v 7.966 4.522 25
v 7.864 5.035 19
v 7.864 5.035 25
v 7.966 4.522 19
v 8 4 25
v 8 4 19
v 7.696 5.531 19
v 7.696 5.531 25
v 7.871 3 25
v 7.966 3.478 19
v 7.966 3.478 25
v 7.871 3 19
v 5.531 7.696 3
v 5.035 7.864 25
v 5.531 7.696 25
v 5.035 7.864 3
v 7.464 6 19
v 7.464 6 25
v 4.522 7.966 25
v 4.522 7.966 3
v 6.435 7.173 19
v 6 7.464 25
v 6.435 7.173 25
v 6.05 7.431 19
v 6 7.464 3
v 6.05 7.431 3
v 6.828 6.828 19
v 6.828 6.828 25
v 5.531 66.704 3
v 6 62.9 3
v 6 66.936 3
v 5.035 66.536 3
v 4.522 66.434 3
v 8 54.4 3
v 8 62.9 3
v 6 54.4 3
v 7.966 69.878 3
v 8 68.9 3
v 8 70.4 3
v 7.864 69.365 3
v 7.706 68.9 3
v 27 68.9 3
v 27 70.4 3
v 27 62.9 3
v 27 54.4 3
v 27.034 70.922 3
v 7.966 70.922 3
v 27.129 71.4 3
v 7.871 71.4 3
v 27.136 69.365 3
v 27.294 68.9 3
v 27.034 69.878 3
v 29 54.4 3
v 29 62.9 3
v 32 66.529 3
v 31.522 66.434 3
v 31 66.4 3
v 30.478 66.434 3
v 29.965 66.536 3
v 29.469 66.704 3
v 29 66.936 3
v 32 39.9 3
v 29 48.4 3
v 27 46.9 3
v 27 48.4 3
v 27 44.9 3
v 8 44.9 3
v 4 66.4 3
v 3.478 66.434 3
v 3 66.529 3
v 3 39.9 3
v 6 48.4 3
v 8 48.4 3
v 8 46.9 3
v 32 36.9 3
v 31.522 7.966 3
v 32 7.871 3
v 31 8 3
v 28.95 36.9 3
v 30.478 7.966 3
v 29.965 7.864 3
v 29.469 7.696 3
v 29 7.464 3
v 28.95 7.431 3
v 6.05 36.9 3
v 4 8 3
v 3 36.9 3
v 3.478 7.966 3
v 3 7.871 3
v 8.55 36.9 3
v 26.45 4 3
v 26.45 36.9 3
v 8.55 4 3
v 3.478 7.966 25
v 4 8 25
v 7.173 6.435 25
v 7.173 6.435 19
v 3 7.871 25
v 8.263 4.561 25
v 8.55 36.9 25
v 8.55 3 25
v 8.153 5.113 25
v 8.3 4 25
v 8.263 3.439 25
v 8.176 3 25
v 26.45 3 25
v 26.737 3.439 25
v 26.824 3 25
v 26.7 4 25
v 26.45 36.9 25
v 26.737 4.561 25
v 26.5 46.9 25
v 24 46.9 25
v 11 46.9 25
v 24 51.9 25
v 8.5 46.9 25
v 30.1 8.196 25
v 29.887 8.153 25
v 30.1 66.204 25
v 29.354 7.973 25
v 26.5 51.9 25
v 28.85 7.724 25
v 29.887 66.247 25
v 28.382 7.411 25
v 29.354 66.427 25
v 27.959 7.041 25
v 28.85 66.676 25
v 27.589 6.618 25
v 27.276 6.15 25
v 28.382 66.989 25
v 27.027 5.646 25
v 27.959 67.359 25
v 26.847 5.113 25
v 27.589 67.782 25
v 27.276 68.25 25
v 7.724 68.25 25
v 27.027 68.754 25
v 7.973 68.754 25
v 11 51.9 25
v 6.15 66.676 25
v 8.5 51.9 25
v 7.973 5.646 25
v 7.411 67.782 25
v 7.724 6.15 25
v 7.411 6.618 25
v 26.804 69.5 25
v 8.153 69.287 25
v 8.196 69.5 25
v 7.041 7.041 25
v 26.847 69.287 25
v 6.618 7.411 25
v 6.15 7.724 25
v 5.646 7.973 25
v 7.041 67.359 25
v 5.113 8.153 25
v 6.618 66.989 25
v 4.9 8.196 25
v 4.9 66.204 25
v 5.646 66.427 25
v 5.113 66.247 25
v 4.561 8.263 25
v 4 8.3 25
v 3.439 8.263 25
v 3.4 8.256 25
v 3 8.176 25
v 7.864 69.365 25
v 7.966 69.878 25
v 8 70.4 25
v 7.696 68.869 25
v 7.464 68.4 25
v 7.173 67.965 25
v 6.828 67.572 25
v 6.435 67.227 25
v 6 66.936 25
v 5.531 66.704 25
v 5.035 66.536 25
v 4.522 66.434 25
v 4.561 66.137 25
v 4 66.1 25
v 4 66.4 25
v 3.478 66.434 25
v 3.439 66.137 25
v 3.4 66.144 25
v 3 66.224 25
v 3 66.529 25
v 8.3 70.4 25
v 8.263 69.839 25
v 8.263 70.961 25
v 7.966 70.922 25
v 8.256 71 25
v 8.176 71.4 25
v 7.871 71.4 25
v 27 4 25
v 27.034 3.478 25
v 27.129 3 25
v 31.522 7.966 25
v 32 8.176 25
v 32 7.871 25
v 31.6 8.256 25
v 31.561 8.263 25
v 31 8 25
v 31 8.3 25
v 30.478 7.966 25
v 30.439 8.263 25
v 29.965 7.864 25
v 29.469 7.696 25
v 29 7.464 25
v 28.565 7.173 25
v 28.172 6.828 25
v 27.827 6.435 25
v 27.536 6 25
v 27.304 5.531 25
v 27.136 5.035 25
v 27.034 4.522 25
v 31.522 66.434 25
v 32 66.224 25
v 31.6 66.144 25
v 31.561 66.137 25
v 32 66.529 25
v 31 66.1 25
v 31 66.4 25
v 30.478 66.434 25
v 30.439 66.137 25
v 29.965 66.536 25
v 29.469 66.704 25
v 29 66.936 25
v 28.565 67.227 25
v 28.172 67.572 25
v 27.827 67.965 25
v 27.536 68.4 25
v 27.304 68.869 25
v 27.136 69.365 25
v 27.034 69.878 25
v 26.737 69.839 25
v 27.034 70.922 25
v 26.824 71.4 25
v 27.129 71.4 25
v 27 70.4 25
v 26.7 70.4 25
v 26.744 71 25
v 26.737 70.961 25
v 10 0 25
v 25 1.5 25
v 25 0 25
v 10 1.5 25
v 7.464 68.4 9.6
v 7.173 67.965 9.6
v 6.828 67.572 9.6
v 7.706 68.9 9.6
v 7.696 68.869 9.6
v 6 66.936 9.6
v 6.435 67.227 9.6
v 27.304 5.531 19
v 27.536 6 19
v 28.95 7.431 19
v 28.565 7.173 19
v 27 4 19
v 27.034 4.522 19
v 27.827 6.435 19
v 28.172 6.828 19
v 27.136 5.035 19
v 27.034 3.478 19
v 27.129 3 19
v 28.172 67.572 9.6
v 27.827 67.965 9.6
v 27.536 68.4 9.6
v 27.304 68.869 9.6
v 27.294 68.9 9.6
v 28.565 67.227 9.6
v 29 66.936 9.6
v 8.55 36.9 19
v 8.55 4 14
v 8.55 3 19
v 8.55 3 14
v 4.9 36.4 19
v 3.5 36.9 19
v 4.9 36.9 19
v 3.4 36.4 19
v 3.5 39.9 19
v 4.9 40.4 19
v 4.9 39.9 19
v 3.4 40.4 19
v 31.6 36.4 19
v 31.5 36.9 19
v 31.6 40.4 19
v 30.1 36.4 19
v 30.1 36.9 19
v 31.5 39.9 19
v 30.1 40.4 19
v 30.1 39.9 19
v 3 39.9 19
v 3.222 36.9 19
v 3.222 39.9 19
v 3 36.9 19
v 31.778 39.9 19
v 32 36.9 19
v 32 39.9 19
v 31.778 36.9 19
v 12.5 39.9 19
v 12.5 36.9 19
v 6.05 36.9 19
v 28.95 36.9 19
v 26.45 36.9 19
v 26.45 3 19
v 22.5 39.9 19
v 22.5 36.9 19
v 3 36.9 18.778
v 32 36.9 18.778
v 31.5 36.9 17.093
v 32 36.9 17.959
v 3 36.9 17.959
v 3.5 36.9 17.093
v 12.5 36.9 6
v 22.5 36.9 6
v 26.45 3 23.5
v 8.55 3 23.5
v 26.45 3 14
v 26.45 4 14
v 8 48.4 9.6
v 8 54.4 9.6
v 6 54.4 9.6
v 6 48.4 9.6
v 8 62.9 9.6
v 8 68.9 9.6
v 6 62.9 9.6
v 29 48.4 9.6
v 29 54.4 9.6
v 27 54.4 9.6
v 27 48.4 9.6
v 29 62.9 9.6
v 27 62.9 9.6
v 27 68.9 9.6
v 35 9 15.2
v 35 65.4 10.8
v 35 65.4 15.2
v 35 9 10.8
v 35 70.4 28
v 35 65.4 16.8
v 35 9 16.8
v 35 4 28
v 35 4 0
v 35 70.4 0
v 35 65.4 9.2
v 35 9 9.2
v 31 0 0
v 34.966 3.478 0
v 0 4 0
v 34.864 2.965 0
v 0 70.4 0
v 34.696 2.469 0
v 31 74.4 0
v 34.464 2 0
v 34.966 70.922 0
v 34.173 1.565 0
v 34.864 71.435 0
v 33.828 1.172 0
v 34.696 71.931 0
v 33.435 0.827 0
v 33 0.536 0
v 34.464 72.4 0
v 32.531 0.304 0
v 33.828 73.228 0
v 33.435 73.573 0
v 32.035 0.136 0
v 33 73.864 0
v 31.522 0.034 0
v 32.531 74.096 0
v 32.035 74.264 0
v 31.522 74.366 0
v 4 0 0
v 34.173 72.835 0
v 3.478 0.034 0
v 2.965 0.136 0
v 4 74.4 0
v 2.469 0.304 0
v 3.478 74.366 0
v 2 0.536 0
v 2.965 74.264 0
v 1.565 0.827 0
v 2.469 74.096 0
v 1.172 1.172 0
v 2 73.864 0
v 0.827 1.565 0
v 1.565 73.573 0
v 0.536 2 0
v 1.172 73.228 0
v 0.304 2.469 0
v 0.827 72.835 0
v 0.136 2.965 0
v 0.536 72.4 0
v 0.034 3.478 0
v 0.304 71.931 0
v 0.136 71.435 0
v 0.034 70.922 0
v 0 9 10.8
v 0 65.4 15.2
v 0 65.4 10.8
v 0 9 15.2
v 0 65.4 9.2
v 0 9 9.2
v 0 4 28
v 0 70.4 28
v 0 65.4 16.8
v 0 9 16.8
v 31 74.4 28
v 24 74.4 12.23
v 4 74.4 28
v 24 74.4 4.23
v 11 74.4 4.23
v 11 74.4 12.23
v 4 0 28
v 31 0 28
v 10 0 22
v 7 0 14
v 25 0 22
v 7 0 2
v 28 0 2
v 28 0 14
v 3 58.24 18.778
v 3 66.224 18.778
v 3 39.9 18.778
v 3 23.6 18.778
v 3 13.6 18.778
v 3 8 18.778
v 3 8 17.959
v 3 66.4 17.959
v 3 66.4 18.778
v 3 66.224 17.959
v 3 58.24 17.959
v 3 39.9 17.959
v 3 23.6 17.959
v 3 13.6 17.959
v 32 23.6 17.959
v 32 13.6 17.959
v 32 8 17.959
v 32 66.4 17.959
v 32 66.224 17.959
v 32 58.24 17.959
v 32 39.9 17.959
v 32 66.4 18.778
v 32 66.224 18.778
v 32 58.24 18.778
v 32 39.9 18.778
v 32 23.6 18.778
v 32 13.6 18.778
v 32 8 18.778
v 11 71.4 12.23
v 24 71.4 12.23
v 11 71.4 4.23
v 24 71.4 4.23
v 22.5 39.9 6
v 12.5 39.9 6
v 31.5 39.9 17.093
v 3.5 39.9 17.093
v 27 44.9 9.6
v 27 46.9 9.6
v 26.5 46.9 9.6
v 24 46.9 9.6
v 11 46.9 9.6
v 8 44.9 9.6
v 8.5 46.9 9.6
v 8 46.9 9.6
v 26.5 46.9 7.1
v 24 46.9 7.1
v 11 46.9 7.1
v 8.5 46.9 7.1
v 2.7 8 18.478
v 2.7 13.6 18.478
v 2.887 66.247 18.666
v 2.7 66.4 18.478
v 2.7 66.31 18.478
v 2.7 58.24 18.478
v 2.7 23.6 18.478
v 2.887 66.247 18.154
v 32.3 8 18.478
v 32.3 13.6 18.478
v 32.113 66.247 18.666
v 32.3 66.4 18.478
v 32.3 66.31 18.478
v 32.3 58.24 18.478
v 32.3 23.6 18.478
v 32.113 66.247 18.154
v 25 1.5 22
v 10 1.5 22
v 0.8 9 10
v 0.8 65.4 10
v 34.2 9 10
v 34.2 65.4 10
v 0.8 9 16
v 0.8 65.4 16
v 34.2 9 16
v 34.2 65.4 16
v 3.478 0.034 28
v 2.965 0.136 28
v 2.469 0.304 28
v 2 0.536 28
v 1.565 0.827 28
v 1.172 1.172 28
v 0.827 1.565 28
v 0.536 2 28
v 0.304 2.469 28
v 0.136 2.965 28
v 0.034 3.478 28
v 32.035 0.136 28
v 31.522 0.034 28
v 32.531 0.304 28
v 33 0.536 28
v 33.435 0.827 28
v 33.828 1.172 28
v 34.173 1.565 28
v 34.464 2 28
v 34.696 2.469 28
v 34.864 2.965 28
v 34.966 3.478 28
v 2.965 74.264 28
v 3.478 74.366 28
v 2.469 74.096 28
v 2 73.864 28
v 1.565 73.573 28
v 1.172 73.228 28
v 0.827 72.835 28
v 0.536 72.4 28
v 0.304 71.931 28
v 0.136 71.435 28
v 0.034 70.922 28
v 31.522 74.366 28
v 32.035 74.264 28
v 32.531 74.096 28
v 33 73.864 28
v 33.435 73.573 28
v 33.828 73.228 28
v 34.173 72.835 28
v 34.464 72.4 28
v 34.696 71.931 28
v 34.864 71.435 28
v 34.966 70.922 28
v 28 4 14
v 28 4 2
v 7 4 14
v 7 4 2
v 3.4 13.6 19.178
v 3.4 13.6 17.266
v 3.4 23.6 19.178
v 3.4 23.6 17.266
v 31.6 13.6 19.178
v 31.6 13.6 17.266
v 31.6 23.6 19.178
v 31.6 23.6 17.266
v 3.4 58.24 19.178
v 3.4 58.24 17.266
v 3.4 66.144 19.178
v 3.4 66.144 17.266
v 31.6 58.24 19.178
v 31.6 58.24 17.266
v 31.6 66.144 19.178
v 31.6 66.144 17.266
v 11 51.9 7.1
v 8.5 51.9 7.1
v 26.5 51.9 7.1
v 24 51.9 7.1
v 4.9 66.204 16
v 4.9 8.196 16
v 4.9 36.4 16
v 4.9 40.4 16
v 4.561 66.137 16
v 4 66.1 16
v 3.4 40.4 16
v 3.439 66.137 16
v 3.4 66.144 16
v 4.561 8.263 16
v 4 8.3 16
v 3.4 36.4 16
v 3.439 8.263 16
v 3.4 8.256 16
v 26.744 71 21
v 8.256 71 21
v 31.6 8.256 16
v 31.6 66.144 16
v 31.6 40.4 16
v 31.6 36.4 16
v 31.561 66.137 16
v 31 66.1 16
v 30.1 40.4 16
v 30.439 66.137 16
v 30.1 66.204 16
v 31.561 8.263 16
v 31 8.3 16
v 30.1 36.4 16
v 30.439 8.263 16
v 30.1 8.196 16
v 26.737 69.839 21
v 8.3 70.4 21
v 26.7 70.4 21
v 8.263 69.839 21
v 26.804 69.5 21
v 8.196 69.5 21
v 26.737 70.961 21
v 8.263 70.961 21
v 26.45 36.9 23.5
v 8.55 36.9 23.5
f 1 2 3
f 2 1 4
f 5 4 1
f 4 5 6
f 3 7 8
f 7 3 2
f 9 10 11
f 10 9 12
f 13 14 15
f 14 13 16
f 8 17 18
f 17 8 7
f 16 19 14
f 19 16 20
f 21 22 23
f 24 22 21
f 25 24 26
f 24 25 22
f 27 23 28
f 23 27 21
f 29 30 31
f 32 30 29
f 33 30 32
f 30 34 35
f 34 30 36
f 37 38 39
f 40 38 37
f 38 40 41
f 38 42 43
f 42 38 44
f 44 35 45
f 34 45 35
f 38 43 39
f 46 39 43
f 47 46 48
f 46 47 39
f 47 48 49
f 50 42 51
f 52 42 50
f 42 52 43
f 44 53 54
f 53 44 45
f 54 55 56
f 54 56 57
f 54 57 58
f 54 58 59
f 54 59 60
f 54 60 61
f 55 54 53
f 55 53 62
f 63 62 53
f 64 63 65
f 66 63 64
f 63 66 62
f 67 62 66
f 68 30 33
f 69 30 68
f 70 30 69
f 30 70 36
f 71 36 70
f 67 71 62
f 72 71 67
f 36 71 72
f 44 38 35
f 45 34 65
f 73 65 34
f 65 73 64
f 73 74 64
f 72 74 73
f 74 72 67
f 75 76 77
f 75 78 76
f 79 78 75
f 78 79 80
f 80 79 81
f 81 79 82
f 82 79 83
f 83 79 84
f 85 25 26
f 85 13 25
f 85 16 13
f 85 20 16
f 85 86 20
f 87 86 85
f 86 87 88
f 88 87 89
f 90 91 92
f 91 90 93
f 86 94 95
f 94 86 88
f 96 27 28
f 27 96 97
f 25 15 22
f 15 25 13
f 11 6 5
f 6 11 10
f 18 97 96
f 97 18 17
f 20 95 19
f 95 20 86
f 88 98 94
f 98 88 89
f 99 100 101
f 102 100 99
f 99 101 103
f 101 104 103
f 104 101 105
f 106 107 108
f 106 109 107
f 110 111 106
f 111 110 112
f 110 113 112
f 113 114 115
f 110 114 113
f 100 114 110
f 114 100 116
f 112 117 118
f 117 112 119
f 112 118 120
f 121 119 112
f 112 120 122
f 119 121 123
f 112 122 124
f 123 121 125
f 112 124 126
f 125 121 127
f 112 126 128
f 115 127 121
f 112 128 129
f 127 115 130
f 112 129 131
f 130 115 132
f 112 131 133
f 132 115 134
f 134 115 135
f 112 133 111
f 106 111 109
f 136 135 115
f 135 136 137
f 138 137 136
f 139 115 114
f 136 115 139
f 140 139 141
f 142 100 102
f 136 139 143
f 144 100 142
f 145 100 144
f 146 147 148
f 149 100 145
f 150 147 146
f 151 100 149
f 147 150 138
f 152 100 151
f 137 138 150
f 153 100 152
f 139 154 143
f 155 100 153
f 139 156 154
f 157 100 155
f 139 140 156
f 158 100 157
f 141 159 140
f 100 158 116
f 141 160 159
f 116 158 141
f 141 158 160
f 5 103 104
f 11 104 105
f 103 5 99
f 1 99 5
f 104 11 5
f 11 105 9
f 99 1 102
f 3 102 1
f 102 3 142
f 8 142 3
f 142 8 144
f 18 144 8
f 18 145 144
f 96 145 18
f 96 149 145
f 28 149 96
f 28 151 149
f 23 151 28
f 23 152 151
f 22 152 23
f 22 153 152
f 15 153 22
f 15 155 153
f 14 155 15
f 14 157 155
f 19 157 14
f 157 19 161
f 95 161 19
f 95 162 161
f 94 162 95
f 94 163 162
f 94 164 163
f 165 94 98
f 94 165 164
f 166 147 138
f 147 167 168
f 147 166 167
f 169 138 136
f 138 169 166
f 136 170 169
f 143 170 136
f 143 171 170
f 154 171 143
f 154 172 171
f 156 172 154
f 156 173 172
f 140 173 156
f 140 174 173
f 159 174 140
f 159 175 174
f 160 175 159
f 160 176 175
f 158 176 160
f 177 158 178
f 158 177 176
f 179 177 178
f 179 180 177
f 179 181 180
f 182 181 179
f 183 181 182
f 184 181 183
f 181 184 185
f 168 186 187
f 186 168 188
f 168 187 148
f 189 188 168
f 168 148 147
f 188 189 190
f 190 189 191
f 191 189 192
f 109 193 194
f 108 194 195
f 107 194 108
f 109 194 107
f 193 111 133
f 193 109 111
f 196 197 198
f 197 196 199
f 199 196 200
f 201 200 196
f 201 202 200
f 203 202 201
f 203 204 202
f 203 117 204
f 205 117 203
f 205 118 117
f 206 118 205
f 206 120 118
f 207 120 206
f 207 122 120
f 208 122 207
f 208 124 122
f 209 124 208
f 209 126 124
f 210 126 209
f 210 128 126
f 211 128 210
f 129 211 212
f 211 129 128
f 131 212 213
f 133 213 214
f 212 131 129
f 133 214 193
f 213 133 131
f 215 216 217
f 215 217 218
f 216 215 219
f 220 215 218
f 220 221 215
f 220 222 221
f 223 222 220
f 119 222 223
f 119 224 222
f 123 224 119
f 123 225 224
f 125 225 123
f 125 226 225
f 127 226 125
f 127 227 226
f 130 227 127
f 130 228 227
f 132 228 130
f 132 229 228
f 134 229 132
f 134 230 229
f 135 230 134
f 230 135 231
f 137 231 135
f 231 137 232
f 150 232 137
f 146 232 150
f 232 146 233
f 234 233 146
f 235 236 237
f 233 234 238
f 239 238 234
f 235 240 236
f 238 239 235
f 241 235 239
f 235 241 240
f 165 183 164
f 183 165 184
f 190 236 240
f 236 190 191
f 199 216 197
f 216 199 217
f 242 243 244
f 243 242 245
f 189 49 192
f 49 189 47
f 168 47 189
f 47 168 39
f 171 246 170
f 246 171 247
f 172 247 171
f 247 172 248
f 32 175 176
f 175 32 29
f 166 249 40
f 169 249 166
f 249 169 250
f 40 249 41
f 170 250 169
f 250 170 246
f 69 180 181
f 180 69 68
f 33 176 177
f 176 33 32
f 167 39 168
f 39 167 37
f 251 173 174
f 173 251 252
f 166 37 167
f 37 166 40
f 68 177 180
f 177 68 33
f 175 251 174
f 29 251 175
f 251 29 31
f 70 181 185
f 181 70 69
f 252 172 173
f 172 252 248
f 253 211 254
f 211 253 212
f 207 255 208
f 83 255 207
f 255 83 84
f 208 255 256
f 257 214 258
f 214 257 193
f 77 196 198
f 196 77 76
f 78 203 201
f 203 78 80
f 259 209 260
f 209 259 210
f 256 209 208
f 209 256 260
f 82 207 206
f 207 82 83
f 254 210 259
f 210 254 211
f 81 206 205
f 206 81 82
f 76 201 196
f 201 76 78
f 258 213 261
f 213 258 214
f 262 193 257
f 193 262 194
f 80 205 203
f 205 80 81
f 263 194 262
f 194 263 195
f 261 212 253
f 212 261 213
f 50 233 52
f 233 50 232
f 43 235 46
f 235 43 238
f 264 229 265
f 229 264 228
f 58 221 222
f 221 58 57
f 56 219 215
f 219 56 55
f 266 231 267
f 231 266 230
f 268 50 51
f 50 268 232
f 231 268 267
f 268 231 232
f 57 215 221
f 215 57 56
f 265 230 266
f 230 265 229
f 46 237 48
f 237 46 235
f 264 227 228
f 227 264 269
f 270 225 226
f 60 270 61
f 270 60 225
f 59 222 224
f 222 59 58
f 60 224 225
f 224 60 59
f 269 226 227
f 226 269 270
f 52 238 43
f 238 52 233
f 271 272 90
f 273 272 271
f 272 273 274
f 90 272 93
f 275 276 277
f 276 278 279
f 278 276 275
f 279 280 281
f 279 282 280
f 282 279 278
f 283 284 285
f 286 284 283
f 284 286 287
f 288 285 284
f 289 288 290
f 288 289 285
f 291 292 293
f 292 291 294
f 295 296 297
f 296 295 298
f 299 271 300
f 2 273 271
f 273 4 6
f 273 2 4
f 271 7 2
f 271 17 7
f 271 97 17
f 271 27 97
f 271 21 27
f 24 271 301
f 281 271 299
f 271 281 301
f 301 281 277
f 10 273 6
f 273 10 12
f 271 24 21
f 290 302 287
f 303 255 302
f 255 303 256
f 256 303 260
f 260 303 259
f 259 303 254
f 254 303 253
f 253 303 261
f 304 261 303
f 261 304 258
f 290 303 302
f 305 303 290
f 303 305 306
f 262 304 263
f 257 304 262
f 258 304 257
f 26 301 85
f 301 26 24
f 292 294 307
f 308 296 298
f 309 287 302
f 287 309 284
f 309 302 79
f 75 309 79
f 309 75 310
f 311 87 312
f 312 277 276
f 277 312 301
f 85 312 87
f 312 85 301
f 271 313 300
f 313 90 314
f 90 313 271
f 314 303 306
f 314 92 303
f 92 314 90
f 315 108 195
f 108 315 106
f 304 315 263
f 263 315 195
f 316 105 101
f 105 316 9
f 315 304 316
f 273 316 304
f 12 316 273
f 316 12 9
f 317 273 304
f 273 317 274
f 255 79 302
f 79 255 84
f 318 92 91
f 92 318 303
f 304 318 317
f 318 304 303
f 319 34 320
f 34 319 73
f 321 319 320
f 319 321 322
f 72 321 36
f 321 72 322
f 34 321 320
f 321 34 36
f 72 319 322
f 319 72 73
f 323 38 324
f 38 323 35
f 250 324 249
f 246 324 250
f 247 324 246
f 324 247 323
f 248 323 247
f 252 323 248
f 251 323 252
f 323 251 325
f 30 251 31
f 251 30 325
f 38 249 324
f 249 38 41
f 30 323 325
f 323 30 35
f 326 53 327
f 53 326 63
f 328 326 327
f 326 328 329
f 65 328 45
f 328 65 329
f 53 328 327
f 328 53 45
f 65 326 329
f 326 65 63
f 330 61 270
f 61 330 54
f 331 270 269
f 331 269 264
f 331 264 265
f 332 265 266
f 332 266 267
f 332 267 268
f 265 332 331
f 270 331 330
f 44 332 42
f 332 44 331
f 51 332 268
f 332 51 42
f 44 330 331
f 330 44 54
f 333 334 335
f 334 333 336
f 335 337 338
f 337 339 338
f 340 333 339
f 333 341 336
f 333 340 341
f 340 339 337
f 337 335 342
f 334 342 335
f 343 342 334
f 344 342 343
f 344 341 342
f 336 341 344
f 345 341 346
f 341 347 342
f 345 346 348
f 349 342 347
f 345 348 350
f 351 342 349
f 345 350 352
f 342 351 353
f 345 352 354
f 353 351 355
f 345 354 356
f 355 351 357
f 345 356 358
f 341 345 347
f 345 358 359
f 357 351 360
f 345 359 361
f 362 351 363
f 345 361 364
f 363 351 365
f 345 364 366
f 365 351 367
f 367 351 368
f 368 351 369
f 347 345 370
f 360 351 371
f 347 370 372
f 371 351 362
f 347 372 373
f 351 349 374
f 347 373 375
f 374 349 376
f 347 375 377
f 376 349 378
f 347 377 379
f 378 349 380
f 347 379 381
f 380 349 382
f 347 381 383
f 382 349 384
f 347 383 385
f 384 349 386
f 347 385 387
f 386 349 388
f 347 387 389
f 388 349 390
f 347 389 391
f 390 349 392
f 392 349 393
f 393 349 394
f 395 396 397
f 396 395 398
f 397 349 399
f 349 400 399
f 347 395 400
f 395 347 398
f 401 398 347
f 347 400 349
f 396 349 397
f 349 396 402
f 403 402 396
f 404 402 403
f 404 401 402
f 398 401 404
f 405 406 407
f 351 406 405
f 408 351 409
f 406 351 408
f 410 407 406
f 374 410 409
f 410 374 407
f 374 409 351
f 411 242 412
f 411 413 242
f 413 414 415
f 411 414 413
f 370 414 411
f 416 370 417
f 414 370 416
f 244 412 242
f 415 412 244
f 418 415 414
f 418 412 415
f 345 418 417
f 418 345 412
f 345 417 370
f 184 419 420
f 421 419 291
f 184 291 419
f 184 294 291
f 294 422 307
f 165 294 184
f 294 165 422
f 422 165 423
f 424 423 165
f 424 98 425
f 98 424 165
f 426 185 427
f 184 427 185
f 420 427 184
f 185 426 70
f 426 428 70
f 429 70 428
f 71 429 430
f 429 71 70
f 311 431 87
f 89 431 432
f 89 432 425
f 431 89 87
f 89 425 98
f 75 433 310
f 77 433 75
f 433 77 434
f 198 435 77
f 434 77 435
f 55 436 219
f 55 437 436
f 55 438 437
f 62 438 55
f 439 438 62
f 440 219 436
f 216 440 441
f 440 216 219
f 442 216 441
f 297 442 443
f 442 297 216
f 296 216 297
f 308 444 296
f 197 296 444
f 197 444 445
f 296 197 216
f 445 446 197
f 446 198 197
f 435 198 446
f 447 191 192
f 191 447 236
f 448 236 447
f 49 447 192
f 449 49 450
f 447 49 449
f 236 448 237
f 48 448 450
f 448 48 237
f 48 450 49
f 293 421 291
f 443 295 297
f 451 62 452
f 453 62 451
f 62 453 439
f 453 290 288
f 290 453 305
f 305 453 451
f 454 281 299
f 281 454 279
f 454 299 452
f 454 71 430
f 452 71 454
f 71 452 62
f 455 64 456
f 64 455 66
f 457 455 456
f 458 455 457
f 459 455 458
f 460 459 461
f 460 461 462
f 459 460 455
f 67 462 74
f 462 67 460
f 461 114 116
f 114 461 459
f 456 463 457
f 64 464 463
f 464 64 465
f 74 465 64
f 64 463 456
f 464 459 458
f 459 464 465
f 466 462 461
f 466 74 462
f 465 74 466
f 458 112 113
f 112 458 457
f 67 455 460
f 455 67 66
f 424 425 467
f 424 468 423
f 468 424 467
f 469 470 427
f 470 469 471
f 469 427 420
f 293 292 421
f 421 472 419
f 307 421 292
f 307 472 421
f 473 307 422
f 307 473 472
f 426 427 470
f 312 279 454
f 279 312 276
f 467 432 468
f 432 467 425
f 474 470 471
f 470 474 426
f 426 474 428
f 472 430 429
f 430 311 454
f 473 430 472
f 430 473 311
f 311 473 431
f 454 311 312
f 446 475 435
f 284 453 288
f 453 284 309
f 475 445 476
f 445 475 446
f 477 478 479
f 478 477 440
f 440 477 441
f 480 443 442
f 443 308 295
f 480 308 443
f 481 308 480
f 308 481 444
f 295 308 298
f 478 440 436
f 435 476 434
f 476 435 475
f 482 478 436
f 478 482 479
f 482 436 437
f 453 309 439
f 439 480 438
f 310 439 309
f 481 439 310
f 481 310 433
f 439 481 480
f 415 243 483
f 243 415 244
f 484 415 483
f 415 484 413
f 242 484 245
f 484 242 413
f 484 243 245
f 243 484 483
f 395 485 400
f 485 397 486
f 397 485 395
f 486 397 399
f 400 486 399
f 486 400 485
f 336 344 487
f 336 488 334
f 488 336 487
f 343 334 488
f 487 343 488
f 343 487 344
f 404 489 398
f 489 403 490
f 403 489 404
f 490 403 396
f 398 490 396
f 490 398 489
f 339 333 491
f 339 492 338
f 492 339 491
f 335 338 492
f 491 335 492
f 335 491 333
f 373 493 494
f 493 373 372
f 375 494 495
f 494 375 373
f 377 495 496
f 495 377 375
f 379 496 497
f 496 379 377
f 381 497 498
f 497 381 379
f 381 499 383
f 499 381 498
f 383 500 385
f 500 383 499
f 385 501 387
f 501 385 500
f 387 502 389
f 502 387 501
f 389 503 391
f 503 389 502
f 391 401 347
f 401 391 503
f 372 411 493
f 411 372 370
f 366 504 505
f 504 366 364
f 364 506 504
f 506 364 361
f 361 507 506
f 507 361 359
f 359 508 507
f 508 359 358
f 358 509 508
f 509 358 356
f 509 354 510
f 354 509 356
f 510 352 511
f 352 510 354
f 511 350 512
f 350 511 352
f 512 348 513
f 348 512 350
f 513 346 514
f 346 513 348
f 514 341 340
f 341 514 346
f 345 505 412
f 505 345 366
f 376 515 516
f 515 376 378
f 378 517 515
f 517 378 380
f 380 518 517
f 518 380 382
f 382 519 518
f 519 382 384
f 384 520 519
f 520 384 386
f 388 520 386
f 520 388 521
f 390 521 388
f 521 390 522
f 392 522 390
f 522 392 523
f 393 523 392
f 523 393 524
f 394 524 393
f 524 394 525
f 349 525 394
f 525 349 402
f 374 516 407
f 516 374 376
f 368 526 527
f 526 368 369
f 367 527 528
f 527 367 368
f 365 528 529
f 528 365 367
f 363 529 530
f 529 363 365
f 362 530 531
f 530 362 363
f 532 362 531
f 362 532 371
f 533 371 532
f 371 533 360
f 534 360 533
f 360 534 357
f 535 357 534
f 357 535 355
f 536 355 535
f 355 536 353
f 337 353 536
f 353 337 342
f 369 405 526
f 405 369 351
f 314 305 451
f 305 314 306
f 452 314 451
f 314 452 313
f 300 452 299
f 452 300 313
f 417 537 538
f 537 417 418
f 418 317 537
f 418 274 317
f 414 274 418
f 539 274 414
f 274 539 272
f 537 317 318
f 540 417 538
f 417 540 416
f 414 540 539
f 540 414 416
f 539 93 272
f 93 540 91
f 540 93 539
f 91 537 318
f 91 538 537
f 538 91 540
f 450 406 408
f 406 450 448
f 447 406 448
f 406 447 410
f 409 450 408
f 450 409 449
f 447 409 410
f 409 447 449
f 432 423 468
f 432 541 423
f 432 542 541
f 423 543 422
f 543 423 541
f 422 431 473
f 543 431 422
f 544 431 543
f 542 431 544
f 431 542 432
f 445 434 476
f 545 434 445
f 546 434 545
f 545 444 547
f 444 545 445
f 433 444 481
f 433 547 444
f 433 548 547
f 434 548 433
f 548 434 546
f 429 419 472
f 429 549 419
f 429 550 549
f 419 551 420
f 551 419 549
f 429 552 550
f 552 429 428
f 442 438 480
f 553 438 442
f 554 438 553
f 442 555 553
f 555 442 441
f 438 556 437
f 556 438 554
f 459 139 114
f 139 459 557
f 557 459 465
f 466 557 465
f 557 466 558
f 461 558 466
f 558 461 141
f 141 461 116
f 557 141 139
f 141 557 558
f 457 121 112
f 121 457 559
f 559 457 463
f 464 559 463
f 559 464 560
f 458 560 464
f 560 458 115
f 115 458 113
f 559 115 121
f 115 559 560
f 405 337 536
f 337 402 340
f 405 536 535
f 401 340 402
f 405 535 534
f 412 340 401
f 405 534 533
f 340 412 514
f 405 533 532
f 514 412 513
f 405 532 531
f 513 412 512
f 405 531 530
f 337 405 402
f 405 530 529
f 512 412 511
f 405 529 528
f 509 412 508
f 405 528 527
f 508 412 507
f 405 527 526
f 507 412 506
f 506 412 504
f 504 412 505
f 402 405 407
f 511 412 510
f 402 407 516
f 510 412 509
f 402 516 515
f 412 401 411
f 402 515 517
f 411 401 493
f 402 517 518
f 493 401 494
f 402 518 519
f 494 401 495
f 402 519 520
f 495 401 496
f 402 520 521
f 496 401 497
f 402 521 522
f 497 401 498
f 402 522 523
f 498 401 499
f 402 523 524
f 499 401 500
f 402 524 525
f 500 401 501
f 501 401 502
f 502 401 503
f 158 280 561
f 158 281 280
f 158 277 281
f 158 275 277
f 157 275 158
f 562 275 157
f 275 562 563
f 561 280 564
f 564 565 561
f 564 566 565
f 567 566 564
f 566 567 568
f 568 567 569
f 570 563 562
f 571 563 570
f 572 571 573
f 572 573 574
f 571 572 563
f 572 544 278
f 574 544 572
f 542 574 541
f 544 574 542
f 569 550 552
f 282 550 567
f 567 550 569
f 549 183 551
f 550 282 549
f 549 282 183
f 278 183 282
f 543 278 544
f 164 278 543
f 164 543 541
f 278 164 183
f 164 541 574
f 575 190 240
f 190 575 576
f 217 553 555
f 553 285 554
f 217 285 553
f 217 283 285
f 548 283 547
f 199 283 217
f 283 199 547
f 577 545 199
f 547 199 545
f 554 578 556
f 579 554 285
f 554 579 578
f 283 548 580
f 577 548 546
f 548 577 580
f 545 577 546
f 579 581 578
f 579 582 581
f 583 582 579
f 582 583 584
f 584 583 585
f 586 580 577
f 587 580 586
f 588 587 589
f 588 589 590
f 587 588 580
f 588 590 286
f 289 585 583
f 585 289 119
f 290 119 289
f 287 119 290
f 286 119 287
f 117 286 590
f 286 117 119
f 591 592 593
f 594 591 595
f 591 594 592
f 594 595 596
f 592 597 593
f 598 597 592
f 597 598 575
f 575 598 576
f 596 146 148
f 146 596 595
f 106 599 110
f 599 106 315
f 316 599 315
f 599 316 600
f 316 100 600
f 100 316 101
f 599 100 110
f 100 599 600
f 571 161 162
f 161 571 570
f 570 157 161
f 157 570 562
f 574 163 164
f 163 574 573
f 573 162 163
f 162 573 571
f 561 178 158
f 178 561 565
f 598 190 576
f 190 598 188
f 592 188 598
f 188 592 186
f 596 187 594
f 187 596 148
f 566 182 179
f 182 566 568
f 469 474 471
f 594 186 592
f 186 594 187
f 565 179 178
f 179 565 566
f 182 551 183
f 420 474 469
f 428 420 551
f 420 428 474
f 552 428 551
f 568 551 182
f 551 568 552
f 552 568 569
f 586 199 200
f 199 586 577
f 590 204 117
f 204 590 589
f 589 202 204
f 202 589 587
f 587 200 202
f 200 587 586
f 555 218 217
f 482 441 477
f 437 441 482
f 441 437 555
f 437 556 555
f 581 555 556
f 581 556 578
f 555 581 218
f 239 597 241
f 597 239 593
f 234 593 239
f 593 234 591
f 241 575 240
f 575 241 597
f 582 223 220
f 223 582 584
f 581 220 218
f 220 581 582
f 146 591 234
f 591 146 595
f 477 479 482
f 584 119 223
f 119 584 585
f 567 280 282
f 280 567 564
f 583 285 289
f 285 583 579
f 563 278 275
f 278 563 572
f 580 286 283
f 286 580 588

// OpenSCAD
// vo-hop-sleeppad-c3.scad — Vỏ hộp cho node sleep-pad: ESP32-C3 Super Mini + 1 cổng USB-A cố định.
// THAY THẾ vo-hop-sleeppad.scad (thiết kế cho ESP32-S3-CAM) — firmware sleep-pad-node đã đổi
// sang C3 Super Mini (nologo_esp32c3_super_mini) từ 24/08. File S3 GIỮ NGUYÊN làm tài liệu lịch
// sử, không xoá. In 2 mảnh: base (sàn + 4 vách) và lid (nắp, khớp bấm — không vít).
//
// CÔNG DỤNG: hộp ngồi dưới sàn/gầm giường, đầu USB-A nhận cáp 4 dây của tấm LSM-800-T, đầu
// USB-C ra nguồn/nạp cho C3. Cáp ra HAI ĐẦU ĐỐI DIỆN nên không chồng dây — GIỮ NGUYÊN lý do gốc
// của bản S3 dù C3 hẹp hơn nhiều nên bố cục song song giờ đã vừa (xem plan
// 260904-0811-thiet-ke-vo-hop-sensor-c3-va-voice-radar): lý do ergonomic (2 đầu dây ra 2 phía
// khi đặt dưới gầm giường) độc lập với bề rộng board — quyết định 04/09, không đổi bố cục.
//
// ⚠️ CỔNG USB-A TRÊN HỘP NÀY KHÔNG PHẢI USB. Nó là UART 115200 8N1 + 5V, đấu qua khối breakout
// USB-A → 4 chân (VCC/GND/D+/D- dùng lại làm UART, xem firmware/sleep-pad-node/include/config.h).
// Cắm chuột/USB thường vào đây thì không cháy nhưng cũng không chạy. Nắp khắc chữ cảnh báo.
//
// VẬT LIỆU: PETG, thành 3mm, FDM. KHÔNG in resin — lý do giống bản S3 (ren đồng ép nóng cần
// nhựa nhiệt dẻo, resin giòn và nằm dưới sàn dễ bị đá phải).
//
// === NGUỒN SỐ ĐO ===
// Khối usba_* CHÉP NGUYÊN VĂN từ vo-hop-sleeppad.scad — linh kiện không đổi, không đo lại.
//
// Khối c3_* — ĐO TAY THẬT 04/09 (không dùng số web 22.5×18mm làm số cuối, đúng bài học đã ghi
// 2 lần trong bản S3 về việc tin số liệu mạng):
//   c3_l = 23.5mm — đo TỪ MÉP CỔNG USB-C (mốc đo, không phải mép board đối diện).
//   c3_w = 18mm.
//   c3_pcb_t = 1.6mm — CHƯA đo tay riêng, dùng số PCB tiêu chuẩn (board mỏng kiểu này hầu hết
//     1.6mm) — chấp nhận theo quyết định 04/09, sửa lại nếu ướm thử lệch.
//   c3_comp_h = 3.5mm — linh kiện cao nhất (chip/nút) — ƯỚC TÍNH, CHƯA ĐO — quyết định 04/09
//     chấp nhận tạm, PHẢI xác nhận bằng miếng ướm (xem test_c3()) trước khi in cả hộp.
//   USB-C ở GIỮA cạnh ngắn (18mm) — xác nhận bằng mắt 04/09, không phải số đo panme.
//   KHÔNG có lỗ vít (board kiểu breadboard trần) — xác nhận 04/09.
//   KHÔNG cần lỗ nút RESET/BOOT trên vỏ — nạp firmware qua USB-C là đủ, quyết định 04/09.
//
// === ĐỊNH VỊ C3: POCKET 4 CẠNH + DÁN, KHÔNG VÍT ===
// Khác hẳn cách bản S3 giữ board (2 trụ vít + 2 trụ đỡ + gờ dẫn hướng chỉ 2 cạnh dài), vì C3
// không có lỗ vít nào. Dùng gờ dẫn hướng bao đủ 4 cạnh (kiểu "định vị + dán" — cùng triết lý đã
// áp dụng cho module radar LD2410C trong vo-hop-modular.scad, module đó cũng không có lỗ vít).
// Thêm 1 cặp gờ chặn nhấc (+z) trên 2 cạnh dài vì không có vít giữ theo phương đứng.

part = "assembly";   // "base" | "lid" | "assembly" | "exploded" | "layout" | "test-usba" | "test-c3"

/* ================= ESP32-C3 Super Mini (đo tay thật 04/09) ================= */
c3_l = 23.5;  c3_w = 18;          // PCB (dài × rộng) — dài đo từ mép cổng USB-C
c3_pcb_t = 1.6;                    // CHƯA đo riêng — số PCB tiêu chuẩn, xem ghi chú đầu file
c3_comp_h = 3.5;                   // linh kiện cao nhất — ƯỚC TÍNH, xem ghi chú đầu file
c3_stand = 2;                      // trụ/gờ đỡ dưới board — board không có chân header thò
                                    // xuống (hàn dây trực tiếp GPIO, không qua header), nên chỉ
                                    // cần hở tối thiểu tránh solder mask/pad chạm sàn.
c3_usb_w = 9;                      // bề rộng thân cổng USB-C + dung sai (thân danh nghĩa ~8.94,
                                    // xem cách tính s3_usb_w cũ trong vo-hop-sleeppad.scad)
c3_usb_plug_clear = 2;             // hở thêm mỗi bên cho vỏ NHỰA của phích — CHƯA đo cục nhựa
                                    // thật, dùng lại giá trị đã nghiệm thu ở bản S3.
c3_usb_open_w = c3_usb_w + 2*c3_usb_plug_clear;   // = 13
c3_usb_open_h = 8;                 // cao hơn thân cổng để nuốt cả vỏ nhựa phích (giữ số bản S3)
c3_usb_out = 0.5;                  // cổng USB-C thò ra khỏi mép PCB — ƯỚC TÍNH nhỏ, C3 supermini
                                    // thường hàn sát mép, khác S3-CAM (1mm) — xác nhận khi ướm.
c3_usb_gap = 0.5;                  // hở giữa mặt cổng và mặt TRONG vách sau (giữ số bản S3)

/* --- Gờ dẫn hướng bao 4 cạnh (thay 2 cạnh + lỗ vít của bản S3) --- */
c3_guide_clear = 0.5;              // hở mỗi bên giữa mép board và mặt trong gờ
c3_guide_t = 2;                    // bề dày mỗi gờ
c3_guide_over = 3;                 // gờ cao hơn nóc PCB bấy nhiêu — còn dẫn hướng suốt hành trình
c3_guide_seg = 6;                  // chiều dài mỗi đoạn gờ hông (ngắn hơn bản S3 vì board ngắn)
c3_guide_in = 1.5;                 // đoạn gờ lùi vào so 2 đầu board

/* --- Gờ chặn nhấc, treo dưới nắp (thay vít, khoá phương +z) --- */
c3_hold_on = true;
c3_hold_w = 2.5;                   // bề rộng mỗi gờ theo x, tính từ mép board vào
c3_hold_l = 5;                     // chiều dài theo y
c3_hold_gap = 0.5;                 // hở giữa đáy gờ và nóc PCB

/* ================= Khối breakout USB-A (chép nguyên văn vo-hop-sleeppad.scad) ================= */
usba_l = 32;
usba_w = 16;
usba_h = 20;
usba_fit = 1.9;                    // nới từ 0.4 lên 1.9 (+1.5mm) — user in ướm test-usba thật
                                    // (05/09), thấy 2 thanh chắn 2 bên bó sát quá, cần rộng thêm
                                    // 1-2mm. usba_fit đối xứng nên +1.5mm tổng độ hở nằm giữa
                                    // khoảng yêu cầu. LƯU Ý: biến này cũng cộng vào usba_back (xem
                                    // dưới) nên tự động góp +1.5mm vào out_l luôn, không phải side
                                    // effect ngoài ý muốn — user cũng yêu cầu vỏ dài thêm (xem
                                    // wire_gap bên dưới cho phần còn lại).
usba_axis_z = 5;
usba_plug_w = 18;  usba_plug_h = 9;  usba_plug_len = 20;
usba_plug_clear = 1.5;
usba_rib_t = 2.5;
usba_rib_h = 16;
usba_stop_t = 3;
usba_wire_w = 10;
usba_wire_z = 3;                   // hạ từ 11 xuống 3 — user in ướm test-usba thật, thấy dây điện
                                    // thật đi sát sàn hơn dự tính, khe cũ (bắt đầu ở 11mm) cản dây.
                                    // User chỉ định "cách mặt sàn 2-3mm" (05/09), không đo tay lại
                                    // toạ độ dây chính xác — chọn 3mm (đầu trên khoảng cho phép).
usba_hold_gap = 0.5;
usba_floor_min = 2;
wire_gap = 7;                      // nới từ 6 lên 7 (+1mm) — cộng với +1.5mm từ usba_fit ở trên,
                                    // tổng out_l dài thêm +2.5mm về hướng USB-A (nằm giữa khoảng
                                    // 2-3mm user yêu cầu 05/09). khoảng trống giữa vách chặn USB-A
                                    // và mép trước board C3

/* ================= Khung ================= */
// inner_w do C3 (18mm) quyết định, không phải khối USB-A (16mm) — C3 rộng hơn 2mm.
// PHẢI chừa đủ để mép board KHÔNG chạm vùng trụ góc (post_d=8, tangent mặt ngoài — post_off=4):
// điều kiện box_cx + c3_w/2 <= out_w - post_d, verify bằng CGAL (base ∩ ghosts phải RỖNG) —
// lần đầu tính inner_w=27 (out_w=33) THIẾU đúng 0.5mm, trụ góc sau-phải đụng mép board (bắt
// được qua kiểm CGAL thật 04/09, không phải suy đoán). +6 (thay +4) cho dư khoảng 1.5mm an toàn.
inner_w = c3_w + 2*(c3_guide_clear + c3_guide_t) + 6;   // = 18 + 2*2.5 + 6 = 29
wall = 3;  floor_t = 3;  lid_t = 3;
deck_h = 22;                       // vẫn do khối USB-A (cao 20) quyết định — C3 thấp hơn nhiều
post_d = 8;
post_off = post_d/2;
m3_free = 3.4;
m3_insert = 4.2;
insert_deep = 6;
lid_lip_h = 4;
lip_w = 1.5;
lip_gap = 0.4;

/* ================= Khớp bấm thay cho vít (giữ nguyên tham số bản S3) ================= */
vit_on = false;
lip_h_ben = 9;                     // NGẮN HƠN bản S3 (12.5) vì hộp ngắn hơn nhiều — cánh tay đòn
                                    // môi phải tính lại theo out_l mới, không copy số cũ nguyên
                                    // xi (xem cảnh báo trong vo-hop-sleeppad.scad về F=3EI·y/L³).
bam_cao = 0.7;
bam_dai = 10;
bam_vao_deg = 30;
bam_giu_deg = 45;
bay_w = 15;  bay_d = 1.5;  bay_h = 3;

label_on = false;
label_size = 4;
label_deep = 0.6;

/* ================= Vân trang trí ================= */
van_on = true;
van_sau = 0.8;
van_zs = [10, 16];                 // 2 mức thay vì 3 — hộp thấp/ngắn hơn bản S3
van_lo = 0.5;

goc_bo = true;
goc_r = post_off;

$fn = 48;

/* ================= Toạ độ suy ra ================= */
out_w = inner_w + 2*wall;                    // = 33
box_cx = out_w/2;                            // = 16.5

usba_y     = wall;                                    // = 3
usba_back  = usba_y + usba_l + usba_fit;              // = 35.4
c3_y       = usba_back + usba_stop_t + wire_gap;       // = 44.4
c3_y_rear  = c3_y + c3_l;                              // = 67.9
out_l      = c3_y_rear + c3_usb_out + c3_usb_gap + wall;   // = 71.9
inner_l    = out_l - 2*wall;

c3_x       = box_cx - c3_w/2;                          // = 7.5

usba_open_w = usba_plug_w + 2*usba_plug_clear;   // = 21
usba_open_h = usba_plug_h + 2*usba_plug_clear;   // = 12
usba_x0    = box_cx - (usba_w + usba_fit)/2;
usba_x1    = usba_x0 + usba_w + usba_fit;
usba_pocket_l = usba_l + usba_fit;
usba_open_z0  = max(usba_floor_min, floor_t + usba_axis_z - usba_open_h/2);
usba_hold_h   = deck_h - usba_h - usba_hold_gap;

// Tâm thân cổng USB-C so đáy NGOÀI hộp: đáy PCB (floor_t + c3_stand) + PCB + nửa thân cổng.
c3_usb_z = floor_t + c3_stand + c3_pcb_t + 3.26/2;

z_pcb_noc = floor_t + c3_stand + c3_pcb_t;
c3_guide_x0 = box_cx - c3_w/2 - c3_guide_clear;
c3_guide_x1 = box_cx + c3_w/2 + c3_guide_clear;
c3_guide_h  = c3_stand + c3_pcb_t + c3_guide_over;
c3_guide_ys = [c3_y + c3_guide_in, c3_y_rear - c3_guide_in - c3_guide_seg];
c3_hold_h  = (floor_t + deck_h) - (z_pcb_noc + c3_hold_gap);

// Gờ chặn NGANG 2 đầu (thay lỗ vít): board không có lỗ, cần chặn cả phương y (rút phích USB-C
// và cắm cáp UART đều tạo lực dọc trục y) — gờ chặn tì vào 2 mép ngắn của board.
c3_stop_front_y = c3_y;             // vách/gờ tì mép trước board (giáp khối USB-A)
c3_stop_back_h  = c3_guide_h;        // gờ chặn sau cao bằng gờ dẫn hướng

van_nho = van_sau + van_lo;
van_y0 = post_d + 1;
van_y1 = out_l - post_d - 1;

z_nap_duoi = floor_t + deck_h;
lip_sau_nhat = max(lid_lip_h, lip_h_ben);
bam_tu_dau = (bam_cao + van_lo)/tan(bam_vao_deg) + 0.4;
bam_z = z_nap_duoi - lip_h_ben + bam_tu_dau;
ranh_sau = bam_cao - lip_gap;
bam_rong = 2*bam_cao;
// 2 vị trí gờ bấm, cách đều trong khoảng hông dài — hộp ngắn hơn bản S3 nên chỉ cần 2 (bản S3
// dùng 2 vị trí [25,89] trên chiều dài 107.9; ở đây chiều dài hông chỉ ~65.9, tính tỉ lệ tương tự).
bam_ys = [out_l * 0.25, out_l * 0.85];
bam_y0 = post_d;
bam_y1 = out_l - post_d;

/* ================= tiện ích (giữ nguyên bản S3) ================= */
module corner_centers() {
    for (x = [post_off, out_w - post_off])
        for (y = [post_off, out_l - post_off])
            translate([x, y, 0]) children();
}

module van_hong() {
    for (z = van_zs)
        for (m = [[0, 1], [out_w, -1]])
            translate([m[0], van_y0, z])
                rotate([-90, 0, 0])
                    linear_extrude(van_y1 - van_y0)
                        polygon([[-m[1]*van_lo, -van_nho],
                                 [ m[1]*van_sau, 0      ],
                                 [-m[1]*van_lo,  van_nho]]);
}

module bo_goc_dung(z0, z1) {
    for (g = [[0, 0, 1, 1], [out_w, 0, -1, 1], [0, out_l, 1, -1], [out_w, out_l, -1, -1]])
        translate([g[0], g[1], z0])
            scale([g[2], g[3], 1])
                linear_extrude(z1 - z0)
                    difference() {
                        square(goc_r);
                        translate([goc_r, goc_r]) circle(r = goc_r);
                    }
}

module ranh_bam() {
    for (w = [[wall, -1], [out_w - wall, 1]])
        translate([w[0], bam_y0, bam_z])
            rotate([-90, 0, 0])
                linear_extrude(bam_y1 - bam_y0)
                    polygon([[-w[1]*van_lo, -(ranh_sau + van_lo)/tan(bam_giu_deg)],
                             [ w[1]*ranh_sau, 0                                  ],
                             [-w[1]*van_lo,  (ranh_sau + van_lo)/tan(bam_vao_deg)]]);
}

module go_bam() {
    for (y = bam_ys)
        for (m = [[wall + lip_gap, -1], [out_w - wall - lip_gap, 1]])
            translate([m[0], y - bam_dai/2, bam_z - z_nap_duoi])
                rotate([-90, 0, 0])
                    linear_extrude(bam_dai)
                        polygon([[-m[1]*van_lo, -(bam_cao + van_lo)/tan(bam_giu_deg)],
                                 [ m[1]*bam_cao, 0                                  ],
                                 [-m[1]*van_lo,  (bam_cao + van_lo)/tan(bam_vao_deg)]]);
}

module khac_bay() {
    translate([box_cx - bay_w/2, -1, z_nap_duoi - bay_h])
        cube([bay_w, bay_d + 1, bay_h + 1]);
}

module base() {
    difference() {
        union() {
            cube([out_w, out_l, floor_t]);
            cube([wall, out_l, floor_t + deck_h]);
            translate([out_w - wall, 0, 0]) cube([wall, out_l, floor_t + deck_h]);
            cube([out_w, wall, floor_t + deck_h]);
            translate([0, out_l - wall, 0]) cube([out_w, wall, floor_t + deck_h]);

            translate([0, 0, floor_t]) corner_centers() cylinder(d = post_d, h = deck_h);

            // --- KHAY USB-A (giữ nguyên bản S3) ---
            for (x = [usba_x0 - usba_rib_t, usba_x1])
                translate([x, usba_y, floor_t])
                    cube([usba_rib_t, usba_pocket_l, usba_rib_h]);
            translate([wall, usba_back, floor_t])
                cube([inner_w, usba_stop_t, usba_rib_h]);

            // --- POCKET C3: gờ dẫn hướng 2 cạnh dài + gờ chặn 2 đầu (thay trụ vít) ---
            for (x = [c3_guide_x0 - c3_guide_t, c3_guide_x1])
                for (y = c3_guide_ys)
                    translate([x, y, floor_t]) cube([c3_guide_t, c3_guide_seg, c3_guide_h]);
            // Gờ chặn mép TRƯỚC (giáp khối USB-A) — chặn board trượt về phía USB-A khi cắm cáp.
            translate([c3_x - c3_guide_clear, c3_y - c3_guide_t, floor_t])
                cube([c3_w + 2*c3_guide_clear, c3_guide_t, c3_guide_h]);
        }

        // Rãnh thoát 4 dây USB-A (giữ nguyên bản S3)
        translate([box_cx - usba_wire_w/2, usba_back - 1, floor_t + usba_wire_z])
            cube([usba_wire_w, usba_stop_t + 2, usba_rib_h - usba_wire_z + 1]);

        if (!vit_on) { ranh_bam(); khac_bay(); }

        // CỬA USB-A ở vách TRƯỚC (giữ nguyên bản S3)
        translate([box_cx - usba_open_w/2, -1, usba_open_z0])
            cube([usba_open_w, wall + 2, usba_open_h]);

        // CỬA USB-C ở vách SAU — 1 cổng duy nhất (C3 chỉ có 1 USB-C, không 2 như S3-CAM)
        translate([box_cx - c3_usb_open_w/2, out_l - wall - 1, c3_usb_z - c3_usb_open_h/2])
            cube([c3_usb_open_w, wall + 2, c3_usb_open_h]);

        if (van_on) van_hong();
        if (goc_bo) bo_goc_dung(-1, floor_t + deck_h + 1);
    }
}

module lid() {
    difference() {
        union() {
            cube([out_w, out_l, lid_t]);

            translate([wall + lip_gap, wall + lip_gap, -lip_h_ben])
                cube([lip_w, inner_l - 2*lip_gap, lip_h_ben]);
            translate([out_w - wall - lip_gap - lip_w, wall + lip_gap, -lip_h_ben])
                cube([lip_w, inner_l - 2*lip_gap, lip_h_ben]);
            translate([wall + lip_gap, out_l - wall - lip_gap - lip_w, -lid_lip_h])
                cube([inner_w - 2*lip_gap, lip_w, lid_lip_h]);

            if (!vit_on) go_bam();

            translate([usba_x0, usba_y, -usba_hold_h])
                cube([usba_w + usba_fit, usba_pocket_l, usba_hold_h]);

            // Gờ CHẶN NHẤC C3 — đè lên 2 mép dài, thay vít (board không có lỗ)
            if (c3_hold_on)
                for (x = [c3_x, c3_x + c3_w - c3_hold_w])
                    translate([x, c3_y, -c3_hold_h]) cube([c3_hold_w, c3_hold_l, c3_hold_h]);
        }

        if (goc_bo) bo_goc_dung(-lip_sau_nhat - 1, lid_t + 1);

        if (vit_on)
            translate([0, 0, -lip_sau_nhat - 2]) corner_centers()
                cylinder(d = m3_free, h = lid_t + lip_sau_nhat + 4);
        if (!vit_on)
            translate([0, usba_back - 0.5, -lip_h_ben - 1])
                cube([out_w, usba_stop_t + 1,
                      (floor_t + usba_rib_h - z_nap_duoi) - (-lip_h_ben - 1)]);

        translate([0, 0, -lip_sau_nhat - 1]) corner_centers()
            cylinder(d = post_d + 0.6, h = lip_sau_nhat + 1);

        if (label_on) {
            translate([box_cx, wall + 18, lid_t - label_deep])
                linear_extrude(label_deep + 1)
                    text("UART 5V", size = label_size, halign = "center", valign = "center");
            translate([box_cx, wall + 11, lid_t - label_deep])
                linear_extrude(label_deep + 1)
                    text("KHONG PHAI USB", size = label_size,
                         halign = "center", valign = "center");
        }
    }
}

module assembly() {
    color("LightSteelBlue") base();
    color("Silver") translate([0, 0, floor_t + deck_h]) lid();
}

module exploded() {
    color("LightSteelBlue") base();
    color("Silver") translate([0, 0, floor_t + deck_h + 28]) lid();
}

/* ================= BÓNG LINH KIỆN (để xem/kiểm, không xuất STL) ================= */
module ghosts() {
    color([0.2, 0.6, 1, 0.45])
        translate([c3_x, c3_y, floor_t + c3_stand]) cube([c3_w, c3_l, c3_pcb_t + c3_comp_h]);
    color([1, 0.5, 0.2, 0.45])
        translate([usba_x0, usba_y, floor_t]) cube([usba_w, usba_l, usba_h]);
    color([0.6, 0.6, 0.6, 0.45])
        translate([box_cx - c3_usb_w/2, c3_y_rear, c3_usb_z - c3_usb_open_h/2])
            cube([c3_usb_w, 6, c3_usb_open_h]);
}

/* ================= MIẾNG ƯỚM ================= */
module test_usba() {
    intersection() { base(); cube([out_w, 42, 26]); }
}
// === KIỂM CGAL THẬT ĐÃ CHẠY 04/09 (openscad 2021.01, không phải suy đoán) ===
//   base() ∩ ghosts(): LẦN ĐẦU inner_w=27 → 20 facet, trụ góc sau-phải đụng mép board 0.5mm
//     (bắt được thật, không phải nhìn hụt trên render). Sửa inner_w=29 → còn 4 facet, khớp mẫu
//     "mặt tiếp xúc có chủ đích" (gờ chặn trước áp sát mép board, cùng loại false-positive đã
//     ghi trong xuat-stl-va-kiem-lo.sh) — chấp nhận, không phải va chạm thật.
//   Cửa USB-C, cửa USB-A: probe ∩ base() đều RỖNG — lỗ thông thật, không "khoét hụt".
//   CHƯA in thật — miếng ướm test_c3()/test_usba() vẫn cần in trước khi in cả hộp, đúng quy
//   trình đã dùng cho bản S3 (kiểm hình học ≠ kiểm lắp ráp thật).
//
// Miếng ướm khoang C3 — CHƯA VERIFY BẰNG IN THẬT, in trước khi in cả hộp.
module test_c3() {
    intersection() { base(); translate([0, c3_y - 4, 0]) cube([out_w, c3_l + 8, 26]); }
}

if      (part == "base")      base();
else if (part == "lid")       lid();
else if (part == "test-usba") test_usba();
else if (part == "test-c3")   test_c3();
else if (part == "layout")    { base(); ghosts(); }
else if (part == "exploded")  exploded();
else                          assembly();
